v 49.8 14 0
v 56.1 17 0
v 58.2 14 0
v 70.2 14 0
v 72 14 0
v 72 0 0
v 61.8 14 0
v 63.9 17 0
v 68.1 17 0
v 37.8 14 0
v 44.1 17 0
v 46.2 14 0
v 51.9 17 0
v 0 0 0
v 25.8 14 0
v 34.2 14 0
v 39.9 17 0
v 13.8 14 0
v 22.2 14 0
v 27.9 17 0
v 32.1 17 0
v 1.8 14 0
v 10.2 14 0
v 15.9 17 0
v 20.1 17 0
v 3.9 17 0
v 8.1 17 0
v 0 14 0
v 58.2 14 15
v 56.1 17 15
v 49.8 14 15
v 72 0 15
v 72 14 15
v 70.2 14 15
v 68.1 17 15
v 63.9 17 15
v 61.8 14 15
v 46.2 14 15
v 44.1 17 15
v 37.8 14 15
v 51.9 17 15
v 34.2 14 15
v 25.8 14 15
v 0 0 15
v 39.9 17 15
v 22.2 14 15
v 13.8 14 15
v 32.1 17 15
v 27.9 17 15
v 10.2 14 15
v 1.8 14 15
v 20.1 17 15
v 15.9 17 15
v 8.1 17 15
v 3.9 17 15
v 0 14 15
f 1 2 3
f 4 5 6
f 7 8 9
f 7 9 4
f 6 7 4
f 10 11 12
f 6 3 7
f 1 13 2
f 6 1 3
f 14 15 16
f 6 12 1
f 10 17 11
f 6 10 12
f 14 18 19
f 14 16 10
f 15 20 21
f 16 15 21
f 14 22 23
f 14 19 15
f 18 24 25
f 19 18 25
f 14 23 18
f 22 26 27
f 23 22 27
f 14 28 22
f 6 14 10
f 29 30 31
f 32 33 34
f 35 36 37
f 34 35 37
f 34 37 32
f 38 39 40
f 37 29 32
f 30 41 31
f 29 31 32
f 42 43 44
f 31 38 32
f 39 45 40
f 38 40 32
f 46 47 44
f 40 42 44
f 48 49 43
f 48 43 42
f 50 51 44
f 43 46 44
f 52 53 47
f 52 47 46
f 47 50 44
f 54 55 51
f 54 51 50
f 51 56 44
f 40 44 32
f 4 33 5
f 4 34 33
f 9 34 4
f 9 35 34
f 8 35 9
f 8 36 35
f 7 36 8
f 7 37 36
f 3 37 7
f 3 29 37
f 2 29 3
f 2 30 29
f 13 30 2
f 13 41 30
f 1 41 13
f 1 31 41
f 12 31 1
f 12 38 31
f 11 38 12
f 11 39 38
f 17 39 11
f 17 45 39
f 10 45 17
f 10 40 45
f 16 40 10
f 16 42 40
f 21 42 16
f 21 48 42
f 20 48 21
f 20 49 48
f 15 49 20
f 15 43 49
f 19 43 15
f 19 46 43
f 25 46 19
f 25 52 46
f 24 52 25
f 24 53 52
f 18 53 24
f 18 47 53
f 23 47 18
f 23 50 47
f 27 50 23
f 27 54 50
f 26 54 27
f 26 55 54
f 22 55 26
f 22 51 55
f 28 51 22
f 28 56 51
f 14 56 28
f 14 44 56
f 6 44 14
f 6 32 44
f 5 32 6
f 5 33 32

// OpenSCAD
$fn = 32;

// ----------------------------------------------------------------------
// Gear rack: 6 teeth, pitch 12 mm
// ----------------------------------------------------------------------

// --- parameters (mm) ---
teeth = 6;                // number of teeth
pitch = 12;               // tooth pitch, X
root_w = 8.4;             // tooth width at the root
tip_w = 4.2;              // tooth width at the tip
base_h = 14;              // rack body height, Y
tooth_h = 3;              // tooth height above the body
plate_t = 15;             // rack width, Z (extrusion height)

rack_l = teeth * pitch;  // overall length
total_h = base_h + tooth_h;  // overall height

profile = [[0, 0], [72, 0], [72, 14], [70.2, 14], [68.1, 17], [63.9, 17], [61.8, 14], [58.2, 14], [56.1, 17], [51.9, 17], [49.8, 14], [46.2, 14], [44.1, 17], [39.9, 17], [37.8, 14], [34.2, 14], [32.1, 17], [27.9, 17], [25.8, 14], [22.2, 14], [20.1, 17], [15.9, 17], [13.8, 14], [10.2, 14], [8.1, 17], [3.9, 17], [1.8, 14], [0, 14]];  // primary outline, 28 points, counter clockwise

// --- the one profile operation ---
linear_extrude(height = plate_t) polygon(points = profile);
